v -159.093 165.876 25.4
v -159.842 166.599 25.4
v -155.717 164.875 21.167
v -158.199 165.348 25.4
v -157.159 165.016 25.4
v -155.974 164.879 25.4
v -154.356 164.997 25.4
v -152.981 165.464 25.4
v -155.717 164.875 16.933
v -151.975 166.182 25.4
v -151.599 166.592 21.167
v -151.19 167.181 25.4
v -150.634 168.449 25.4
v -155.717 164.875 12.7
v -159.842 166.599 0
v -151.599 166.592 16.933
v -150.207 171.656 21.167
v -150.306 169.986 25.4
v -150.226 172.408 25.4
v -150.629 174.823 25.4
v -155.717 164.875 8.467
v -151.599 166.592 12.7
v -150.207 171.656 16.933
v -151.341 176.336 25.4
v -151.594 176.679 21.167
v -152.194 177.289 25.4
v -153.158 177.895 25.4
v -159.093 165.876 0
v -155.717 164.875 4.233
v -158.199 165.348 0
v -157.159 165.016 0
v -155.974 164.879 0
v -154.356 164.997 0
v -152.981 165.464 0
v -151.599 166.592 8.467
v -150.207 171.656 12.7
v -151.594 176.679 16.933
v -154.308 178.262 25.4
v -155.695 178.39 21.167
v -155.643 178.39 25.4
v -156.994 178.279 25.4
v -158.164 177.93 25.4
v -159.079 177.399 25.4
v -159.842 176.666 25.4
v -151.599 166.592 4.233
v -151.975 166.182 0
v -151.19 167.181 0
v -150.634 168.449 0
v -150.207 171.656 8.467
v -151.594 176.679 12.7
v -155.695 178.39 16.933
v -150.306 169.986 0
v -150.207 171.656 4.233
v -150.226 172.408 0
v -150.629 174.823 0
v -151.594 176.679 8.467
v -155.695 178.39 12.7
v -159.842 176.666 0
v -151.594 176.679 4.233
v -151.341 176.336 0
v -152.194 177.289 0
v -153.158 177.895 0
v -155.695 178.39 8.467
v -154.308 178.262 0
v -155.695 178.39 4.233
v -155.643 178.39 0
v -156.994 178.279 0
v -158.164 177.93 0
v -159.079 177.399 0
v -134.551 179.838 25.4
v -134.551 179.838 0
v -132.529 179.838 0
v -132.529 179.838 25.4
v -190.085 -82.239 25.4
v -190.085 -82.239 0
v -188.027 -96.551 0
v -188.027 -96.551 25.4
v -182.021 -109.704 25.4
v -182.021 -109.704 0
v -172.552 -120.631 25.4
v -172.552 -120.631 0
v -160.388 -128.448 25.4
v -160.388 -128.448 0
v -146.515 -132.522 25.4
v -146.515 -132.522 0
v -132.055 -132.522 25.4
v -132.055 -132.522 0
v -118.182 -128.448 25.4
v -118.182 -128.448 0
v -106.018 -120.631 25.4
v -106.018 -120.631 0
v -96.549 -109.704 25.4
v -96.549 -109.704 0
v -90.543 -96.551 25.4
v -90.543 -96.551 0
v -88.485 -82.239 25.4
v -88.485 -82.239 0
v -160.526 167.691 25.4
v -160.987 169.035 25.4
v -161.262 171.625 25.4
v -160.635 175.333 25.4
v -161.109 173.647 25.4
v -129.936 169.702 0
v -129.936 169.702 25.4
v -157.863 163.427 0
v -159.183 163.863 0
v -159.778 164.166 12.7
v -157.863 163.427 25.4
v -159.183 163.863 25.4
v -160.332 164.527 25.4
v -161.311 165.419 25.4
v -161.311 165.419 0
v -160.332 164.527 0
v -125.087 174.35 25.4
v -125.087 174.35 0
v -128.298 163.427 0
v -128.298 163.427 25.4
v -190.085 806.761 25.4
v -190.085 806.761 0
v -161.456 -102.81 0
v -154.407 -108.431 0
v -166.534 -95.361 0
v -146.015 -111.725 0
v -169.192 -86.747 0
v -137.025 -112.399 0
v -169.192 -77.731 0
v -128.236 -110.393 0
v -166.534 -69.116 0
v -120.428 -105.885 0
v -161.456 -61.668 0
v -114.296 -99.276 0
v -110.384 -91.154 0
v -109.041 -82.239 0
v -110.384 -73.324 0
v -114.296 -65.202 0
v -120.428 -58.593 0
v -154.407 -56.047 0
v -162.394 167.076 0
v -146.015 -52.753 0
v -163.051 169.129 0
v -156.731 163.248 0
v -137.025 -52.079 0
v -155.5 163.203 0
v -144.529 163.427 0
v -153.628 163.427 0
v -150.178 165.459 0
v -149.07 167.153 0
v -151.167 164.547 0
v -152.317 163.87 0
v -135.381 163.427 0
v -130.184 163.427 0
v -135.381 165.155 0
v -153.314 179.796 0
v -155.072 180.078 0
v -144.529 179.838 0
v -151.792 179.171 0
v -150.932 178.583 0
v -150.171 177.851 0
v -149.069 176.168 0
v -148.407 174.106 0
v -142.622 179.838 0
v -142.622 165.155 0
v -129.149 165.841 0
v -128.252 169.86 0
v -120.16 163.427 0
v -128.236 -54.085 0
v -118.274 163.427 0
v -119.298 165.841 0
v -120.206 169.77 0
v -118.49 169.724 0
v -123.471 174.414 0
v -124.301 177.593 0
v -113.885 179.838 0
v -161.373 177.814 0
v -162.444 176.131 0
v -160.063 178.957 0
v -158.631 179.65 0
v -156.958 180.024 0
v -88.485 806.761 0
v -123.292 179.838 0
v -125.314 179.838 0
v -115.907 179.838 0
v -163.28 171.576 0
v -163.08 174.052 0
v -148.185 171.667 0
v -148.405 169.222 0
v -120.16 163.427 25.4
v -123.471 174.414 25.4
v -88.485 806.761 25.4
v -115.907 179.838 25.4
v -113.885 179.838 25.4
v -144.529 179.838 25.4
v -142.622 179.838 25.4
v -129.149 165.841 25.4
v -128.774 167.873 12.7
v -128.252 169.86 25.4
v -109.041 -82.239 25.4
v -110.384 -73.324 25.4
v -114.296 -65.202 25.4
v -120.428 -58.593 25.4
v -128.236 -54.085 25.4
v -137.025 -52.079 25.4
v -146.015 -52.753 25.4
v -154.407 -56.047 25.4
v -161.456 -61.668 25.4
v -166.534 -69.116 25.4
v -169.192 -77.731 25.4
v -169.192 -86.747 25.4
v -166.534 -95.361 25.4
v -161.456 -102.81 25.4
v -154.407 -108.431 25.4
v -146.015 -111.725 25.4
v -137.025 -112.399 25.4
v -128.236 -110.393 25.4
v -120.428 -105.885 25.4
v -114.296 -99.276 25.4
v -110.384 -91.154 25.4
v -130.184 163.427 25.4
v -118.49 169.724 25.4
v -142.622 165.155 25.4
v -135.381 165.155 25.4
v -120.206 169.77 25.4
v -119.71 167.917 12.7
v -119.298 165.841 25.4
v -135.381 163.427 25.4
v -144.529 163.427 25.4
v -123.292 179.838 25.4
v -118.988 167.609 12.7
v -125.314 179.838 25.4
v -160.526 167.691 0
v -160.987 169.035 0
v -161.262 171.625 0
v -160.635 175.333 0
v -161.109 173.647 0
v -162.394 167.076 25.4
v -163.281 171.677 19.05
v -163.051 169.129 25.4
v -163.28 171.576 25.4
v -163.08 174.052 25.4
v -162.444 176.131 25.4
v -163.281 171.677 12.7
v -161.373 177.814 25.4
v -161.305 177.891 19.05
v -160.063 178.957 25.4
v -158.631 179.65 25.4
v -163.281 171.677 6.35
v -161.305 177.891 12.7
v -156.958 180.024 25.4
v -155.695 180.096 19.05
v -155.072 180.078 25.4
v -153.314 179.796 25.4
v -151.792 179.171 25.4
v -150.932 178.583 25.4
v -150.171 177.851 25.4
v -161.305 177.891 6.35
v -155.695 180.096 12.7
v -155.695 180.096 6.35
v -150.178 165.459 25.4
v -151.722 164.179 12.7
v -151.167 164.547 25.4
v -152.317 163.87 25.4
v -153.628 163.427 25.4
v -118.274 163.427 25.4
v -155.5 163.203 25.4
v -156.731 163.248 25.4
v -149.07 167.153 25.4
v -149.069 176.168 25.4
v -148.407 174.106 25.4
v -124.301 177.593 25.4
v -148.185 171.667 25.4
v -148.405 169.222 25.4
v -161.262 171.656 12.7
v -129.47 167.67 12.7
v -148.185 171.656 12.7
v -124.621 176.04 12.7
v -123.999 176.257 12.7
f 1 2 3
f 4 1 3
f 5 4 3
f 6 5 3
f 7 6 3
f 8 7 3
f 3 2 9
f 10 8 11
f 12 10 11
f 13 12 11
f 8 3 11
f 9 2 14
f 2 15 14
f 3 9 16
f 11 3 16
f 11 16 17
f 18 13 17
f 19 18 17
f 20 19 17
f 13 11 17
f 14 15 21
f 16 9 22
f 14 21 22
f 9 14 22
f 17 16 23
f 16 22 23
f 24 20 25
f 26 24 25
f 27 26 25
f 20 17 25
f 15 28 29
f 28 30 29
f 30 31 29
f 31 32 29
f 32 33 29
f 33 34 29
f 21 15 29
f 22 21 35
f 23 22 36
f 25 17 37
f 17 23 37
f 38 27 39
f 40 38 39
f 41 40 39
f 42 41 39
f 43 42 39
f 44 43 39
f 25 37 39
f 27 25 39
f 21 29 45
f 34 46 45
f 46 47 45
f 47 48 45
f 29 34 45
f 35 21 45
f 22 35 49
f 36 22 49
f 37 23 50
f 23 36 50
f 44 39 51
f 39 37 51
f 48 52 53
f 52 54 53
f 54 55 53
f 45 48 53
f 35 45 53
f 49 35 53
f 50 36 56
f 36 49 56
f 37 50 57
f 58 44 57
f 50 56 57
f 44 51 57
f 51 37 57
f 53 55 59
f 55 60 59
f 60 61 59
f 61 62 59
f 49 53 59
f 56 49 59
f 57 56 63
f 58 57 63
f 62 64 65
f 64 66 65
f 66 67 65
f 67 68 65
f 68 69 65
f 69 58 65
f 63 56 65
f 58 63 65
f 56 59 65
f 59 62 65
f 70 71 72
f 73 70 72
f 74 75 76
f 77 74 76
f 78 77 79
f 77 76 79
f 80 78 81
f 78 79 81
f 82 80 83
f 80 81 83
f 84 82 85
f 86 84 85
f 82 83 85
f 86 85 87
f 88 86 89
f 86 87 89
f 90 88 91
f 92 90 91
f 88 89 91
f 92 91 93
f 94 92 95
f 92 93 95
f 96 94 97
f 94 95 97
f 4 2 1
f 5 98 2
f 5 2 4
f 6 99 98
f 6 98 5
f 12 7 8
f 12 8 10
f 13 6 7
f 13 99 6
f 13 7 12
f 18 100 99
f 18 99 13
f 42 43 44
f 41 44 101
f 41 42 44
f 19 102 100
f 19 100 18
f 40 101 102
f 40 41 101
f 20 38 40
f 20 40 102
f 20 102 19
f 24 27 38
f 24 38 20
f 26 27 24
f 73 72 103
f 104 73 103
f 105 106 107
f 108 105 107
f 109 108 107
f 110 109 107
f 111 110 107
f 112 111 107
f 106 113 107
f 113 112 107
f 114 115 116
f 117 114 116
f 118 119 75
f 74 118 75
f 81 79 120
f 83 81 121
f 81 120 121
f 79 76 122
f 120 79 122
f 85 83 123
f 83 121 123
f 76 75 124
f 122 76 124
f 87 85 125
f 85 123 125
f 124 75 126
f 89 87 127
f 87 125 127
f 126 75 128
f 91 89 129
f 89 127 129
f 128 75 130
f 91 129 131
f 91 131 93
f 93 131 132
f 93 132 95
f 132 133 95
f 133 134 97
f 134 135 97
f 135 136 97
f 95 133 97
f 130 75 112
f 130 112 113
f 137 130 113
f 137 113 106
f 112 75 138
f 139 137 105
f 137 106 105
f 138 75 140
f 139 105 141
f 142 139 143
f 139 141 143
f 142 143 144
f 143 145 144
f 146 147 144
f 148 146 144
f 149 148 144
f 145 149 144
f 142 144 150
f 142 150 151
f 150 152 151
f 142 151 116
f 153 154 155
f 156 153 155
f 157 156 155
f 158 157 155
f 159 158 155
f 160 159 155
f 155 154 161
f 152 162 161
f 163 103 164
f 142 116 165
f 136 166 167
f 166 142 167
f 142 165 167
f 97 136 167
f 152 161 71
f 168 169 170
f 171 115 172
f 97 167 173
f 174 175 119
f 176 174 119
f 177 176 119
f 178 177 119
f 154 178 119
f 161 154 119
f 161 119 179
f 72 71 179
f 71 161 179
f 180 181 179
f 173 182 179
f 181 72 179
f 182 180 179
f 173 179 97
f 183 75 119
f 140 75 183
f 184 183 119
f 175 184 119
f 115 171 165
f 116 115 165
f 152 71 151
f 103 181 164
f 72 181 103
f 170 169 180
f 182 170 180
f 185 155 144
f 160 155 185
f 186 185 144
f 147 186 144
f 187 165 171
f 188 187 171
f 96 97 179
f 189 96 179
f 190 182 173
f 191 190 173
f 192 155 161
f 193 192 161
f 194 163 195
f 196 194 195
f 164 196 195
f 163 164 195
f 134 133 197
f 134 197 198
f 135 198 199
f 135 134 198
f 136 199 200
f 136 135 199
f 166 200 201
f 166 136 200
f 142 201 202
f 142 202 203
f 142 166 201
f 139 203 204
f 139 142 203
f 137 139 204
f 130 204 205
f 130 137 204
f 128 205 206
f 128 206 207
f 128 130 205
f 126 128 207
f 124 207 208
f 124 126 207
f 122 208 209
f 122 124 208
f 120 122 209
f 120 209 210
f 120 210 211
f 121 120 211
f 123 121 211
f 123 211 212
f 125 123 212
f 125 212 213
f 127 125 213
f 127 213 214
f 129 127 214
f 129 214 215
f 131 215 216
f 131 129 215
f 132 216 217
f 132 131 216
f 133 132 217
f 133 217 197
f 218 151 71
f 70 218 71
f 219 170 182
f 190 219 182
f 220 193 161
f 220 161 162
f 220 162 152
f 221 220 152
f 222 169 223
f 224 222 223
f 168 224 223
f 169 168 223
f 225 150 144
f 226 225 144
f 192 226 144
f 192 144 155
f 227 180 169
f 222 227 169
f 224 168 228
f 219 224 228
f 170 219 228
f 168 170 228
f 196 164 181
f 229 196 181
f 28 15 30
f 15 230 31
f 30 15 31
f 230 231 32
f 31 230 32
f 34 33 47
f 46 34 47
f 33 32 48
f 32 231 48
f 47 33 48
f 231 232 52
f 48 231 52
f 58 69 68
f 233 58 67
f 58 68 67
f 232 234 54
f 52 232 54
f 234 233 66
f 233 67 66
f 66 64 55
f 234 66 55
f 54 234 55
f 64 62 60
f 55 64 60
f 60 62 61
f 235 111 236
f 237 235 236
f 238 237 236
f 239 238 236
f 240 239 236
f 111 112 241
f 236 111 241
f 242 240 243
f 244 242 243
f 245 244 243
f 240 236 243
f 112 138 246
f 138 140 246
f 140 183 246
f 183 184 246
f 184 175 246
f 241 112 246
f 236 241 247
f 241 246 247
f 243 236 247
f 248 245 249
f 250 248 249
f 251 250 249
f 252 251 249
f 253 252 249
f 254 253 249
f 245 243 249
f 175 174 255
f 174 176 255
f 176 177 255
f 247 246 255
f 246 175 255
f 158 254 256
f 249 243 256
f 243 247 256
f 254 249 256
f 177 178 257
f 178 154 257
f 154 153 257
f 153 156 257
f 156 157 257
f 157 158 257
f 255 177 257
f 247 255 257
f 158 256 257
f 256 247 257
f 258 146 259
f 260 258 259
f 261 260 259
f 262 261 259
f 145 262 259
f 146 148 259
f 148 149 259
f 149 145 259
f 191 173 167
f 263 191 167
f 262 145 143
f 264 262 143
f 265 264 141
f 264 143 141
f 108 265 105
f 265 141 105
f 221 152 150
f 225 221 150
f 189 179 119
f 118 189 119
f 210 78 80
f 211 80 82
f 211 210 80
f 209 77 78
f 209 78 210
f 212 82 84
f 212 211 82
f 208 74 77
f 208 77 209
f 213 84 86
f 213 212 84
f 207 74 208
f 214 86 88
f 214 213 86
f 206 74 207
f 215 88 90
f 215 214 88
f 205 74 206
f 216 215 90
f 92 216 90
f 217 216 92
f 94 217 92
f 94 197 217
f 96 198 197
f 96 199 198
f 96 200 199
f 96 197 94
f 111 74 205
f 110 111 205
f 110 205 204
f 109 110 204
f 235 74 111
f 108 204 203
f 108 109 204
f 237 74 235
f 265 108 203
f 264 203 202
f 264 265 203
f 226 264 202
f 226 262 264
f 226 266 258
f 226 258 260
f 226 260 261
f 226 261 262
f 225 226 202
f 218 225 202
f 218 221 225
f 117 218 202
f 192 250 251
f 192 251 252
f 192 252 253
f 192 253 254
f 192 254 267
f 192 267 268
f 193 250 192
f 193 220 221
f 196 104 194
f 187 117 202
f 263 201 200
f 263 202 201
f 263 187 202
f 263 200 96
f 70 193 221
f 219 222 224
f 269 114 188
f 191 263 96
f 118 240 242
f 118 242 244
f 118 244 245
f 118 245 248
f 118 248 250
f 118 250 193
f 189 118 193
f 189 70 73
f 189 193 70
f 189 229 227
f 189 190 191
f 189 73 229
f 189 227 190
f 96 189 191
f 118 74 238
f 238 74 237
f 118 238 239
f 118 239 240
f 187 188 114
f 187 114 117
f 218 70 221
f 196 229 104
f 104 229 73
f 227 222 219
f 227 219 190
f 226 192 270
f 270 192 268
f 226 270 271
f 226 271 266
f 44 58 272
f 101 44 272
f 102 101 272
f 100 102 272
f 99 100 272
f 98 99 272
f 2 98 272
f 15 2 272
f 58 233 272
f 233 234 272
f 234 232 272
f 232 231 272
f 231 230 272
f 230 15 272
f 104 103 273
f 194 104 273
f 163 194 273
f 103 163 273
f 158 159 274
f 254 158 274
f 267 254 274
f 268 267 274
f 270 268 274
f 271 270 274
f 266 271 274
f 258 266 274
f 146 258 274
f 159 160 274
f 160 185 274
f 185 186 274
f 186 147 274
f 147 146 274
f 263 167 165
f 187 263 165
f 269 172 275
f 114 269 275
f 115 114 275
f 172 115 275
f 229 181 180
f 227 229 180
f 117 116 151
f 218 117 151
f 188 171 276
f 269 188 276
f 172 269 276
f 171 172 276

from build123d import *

# Parameters (mm, degrees)
F0_R     = 30.2442698834
F1_DEPTH = 25.4


with BuildPart() as f1:
    # F0 (on Top) → F1 (new body)
    with BuildSketch(Plane.XY):
        with BuildLine():
            ThreePointArc((-190.0850385427, -82.2389796376), (-139.2850385427, -133.0389796376), (-88.4850385427, -82.2389796376))
            Line((-88.4850385427, -82.2389796376), (-88.4850385427, 806.7610203624))
            Line((-88.4850385427, 806.7610203624), (-190.0850385427, 806.7610203624))
            Line((-190.0850385427, 806.7610203624), (-190.0850385427, -82.2389796376))
        make_face()
        with Locations((-139.2850385427, -82.2389796376)):
            Circle(F0_R, mode=Mode.SUBTRACT)
        with BuildLine():
            Line((-113.8850385427, 179.8376055464), (-113.8850385427, 163.4274528315))
            Line((-113.8850385427, 163.4274528315), (-118.274009131, 163.4274528315))
            Line((-118.274009131, 163.4274528315), (-120.1596143346, 163.4274528315))
            Line((-120.1596143346, 163.4274528315), (-128.2982455563, 163.4274528315))
            Line((-128.2982455563, 163.4274528315), (-130.1838507599, 163.4274528315))
            Line((-130.1838507599, 163.4274528315), (-135.380937864, 163.4274528315))
            Line((-135.380937864, 163.4274528315), (-144.5288168233, 163.4274528315))
            Line((-144.5288168233, 163.4274528315), (-153.6275803556, 163.4274528315))
            add(Edge.make_bspline(
                [(-153.6275803556, 163.4274528315), (-154.5943963548, 163.201180207), (-155.7167410314, 163.201180207)],
                knots=[0.6833950988, 0.6833950988, 0.6833950988, 1, 1, 1], degree=2))
            add(Edge.make_bspline(
                [(-155.7167410314, 163.201180207), (-156.8742768127, 163.201180207), (-157.8630700132, 163.4274528315)],
                knots=[0, 0, 0, 0.319412416, 0.319412416, 0.319412416], degree=2))
            Line((-157.8630700132, 163.4274528315), (-164.6850385427, 163.4274528315))
            Line((-164.6850385427, 163.4274528315), (-164.6850385427, 713.4521007538))
            Line((-164.6850385427, 713.4521007538), (-113.8850385427, 713.4521007538))
            Line((-113.8850385427, 713.4521007538), (-113.8850385427, 179.8376055464))
        make_face(mode=Mode.SUBTRACT)
        with BuildLine():
            Line((-115.9071256468, 179.8376055464), (-113.8850385427, 179.8376055464))
            Line((-113.8850385427, 179.8376055464), (-113.8850385427, 713.4521007538))
            Line((-113.8850385427, 713.4521007538), (-164.6850385427, 713.4521007538))
            Line((-164.6850385427, 713.4521007538), (-164.6850385427, 163.4274528315))
            Line((-164.6850385427, 163.4274528315), (-157.8630700132, 163.4274528315))
            add(Edge.make_bspline(
                [(-157.8630700132, 163.4274528315), (-159.9699398208, 163.9095829275), (-161.3107031355, 165.4190110894)],
                knots=[0.319412416, 0.319412416, 0.319412416, 1, 1, 1], degree=2))
            add(Edge.make_bspline(
                [(-161.3107031355, 165.4190110894), (-163.2807116197, 167.6368419717), (-163.2807116197, 171.6774245509)],
                knots=[0, 0, 0, 1, 1, 1], degree=2))
            add(Edge.make_bspline(
                [(-163.2807116197, 171.6774245509), (-163.2807116197, 175.6856824695), (-161.3053156921, 177.8909426505)],
                knots=[0, 0, 0, 1, 1, 1], degree=2))
            add(Edge.make_bspline(
                [(-161.3053156921, 177.8909426505), (-159.3299197645, 180.0962028315), (-155.6951912577, 180.0962028315)],
                knots=[0, 0, 0, 1, 1, 1], degree=2))
            add(Edge.make_bspline(
                [(-155.6951912577, 180.0962028315), (-152.1574367328, 180.0962028315), (-150.1712659183, 177.8514347319)],
                knots=[0, 0, 0, 1, 1, 1], degree=2))
            add(Edge.make_bspline(
                [(-150.1712659183, 177.8514347319), (-148.1850951038, 175.6066666324), (-148.1850951038, 171.6558747772)],
                knots=[0, 0, 0, 1, 1, 1], degree=2))
            add(Edge.make_bspline(
                [(-148.1850951038, 171.6558747772), (-148.1850951038, 167.7158578088), (-150.1784491762, 165.4585190079)],
                knots=[0, 0, 0, 1, 1, 1], degree=2))
            add(Edge.make_bspline(
                [(-150.1784491762, 165.4585190079), (-151.5406975794, 163.9158647351), (-153.6275803556, 163.4274528315)],
                knots=[0, 0, 0, 0.6833950988, 0.6833950988, 0.6833950988], degree=2))
            Line((-153.6275803556, 163.4274528315), (-144.5288168233, 163.4274528315))
            Line((-144.5288168233, 163.4274528315), (-144.5288168233, 179.8376055464))
            Line((-144.5288168233, 179.8376055464), (-142.6216618459, 179.8376055464))
            Line((-142.6216618459, 179.8376055464), (-142.6216618459, 165.1550263609))
            Line((-142.6216618459, 165.1550263609), (-135.380937864, 165.1550263609))
            Line((-135.380937864, 165.1550263609), (-135.380937864, 163.4274528315))
            Line((-135.380937864, 163.4274528315), (-130.1838507599, 163.4274528315))
            Line((-130.1838507599, 163.4274528315), (-134.5512715744, 179.8376055464))
            Line((-134.5512715744, 179.8376055464), (-132.5291844703, 179.8376055464))
            Line((-132.5291844703, 179.8376055464), (-129.9360283618, 169.7020286233))
            add(Edge.make_bspline(
                [(-129.9360283618, 169.7020286233), (-129.3972840179, 167.5686010215), (-129.1494616197, 165.8410274921)],
                knots=[0, 0, 0, 1, 1, 1], degree=2))
            add(Edge.make_bspline(
                [(-129.1494616197, 165.8410274921), (-128.8477647871, 167.8954392568), (-128.2515543799, 169.8600602975)],
                knots=[0, 0, 0, 1, 1, 1], degree=2))
            Line((-128.2515543799, 169.8600602975), (-125.3136018912, 179.8376055464))
            Line((-125.3136018912, 179.8376055464), (-123.2915147871, 179.8376055464))
            Line((-123.2915147871, 179.8376055464), (-120.2063055111, 169.7702695735))
            add(Edge.make_bspline(
                [(-120.2063055111, 169.7702695735), (-119.6675611672, 168.0283295283), (-119.2976233844, 165.8410274921)],
                knots=[0, 0, 0, 1, 1, 1], degree=2))
            add(Edge.make_bspline(
                [(-119.2976233844, 165.8410274921), (-119.0821256468, 167.43571075), (-118.4895068685, 169.7235783971)],
                knots=[0, 0, 0, 1, 1, 1], degree=2))
            Line((-118.4895068685, 169.7235783971), (-115.9071256468, 179.8376055464))
        make_face()
        with BuildLine():
            Line((-128.2982455563, 163.4274528315), (-120.1596143346, 163.4274528315))
            Line((-120.1596143346, 163.4274528315), (-123.4710962351, 174.4142458179))
            add(Edge.make_bspline(
                [(-123.4710962351, 174.4142458179), (-123.7081437464, 175.1469381256), (-123.9990656921, 176.256751474)],
                knots=[0, 0, 0, 1, 1, 1], degree=2))
            add(Edge.make_bspline(
                [(-123.9990656921, 176.256751474), (-124.2899876378, 177.3665648224), (-124.3007625246, 177.5928374468)],
                knots=[0, 0, 0, 1, 1, 1], degree=2))
            add(Edge.make_bspline(
                [(-124.3007625246, 177.5928374468), (-124.5485849228, 176.1094946867), (-125.0873292667, 174.3495964966)],
                knots=[0, 0, 0, 1, 1, 1], degree=2))
            Line((-125.0873292667, 174.3495964966), (-128.2982455563, 163.4274528315))
        make_face()
        Polygon((-118.274009131, 163.4274528315), (-113.8850385427, 163.4274528315), (-113.8850385427, 179.8376055464), align=None)
    extrude(amount=F1_DEPTH)


with BuildPart() as f1b:
    # F0 (on Top) → F1, piece 2 (new body)
    with BuildSketch(Plane.XY):
        with BuildLine():
            add(Edge.make_bspline(
                [(-159.8417268912, 176.6661971754), (-161.2622161446, 174.9422152749), (-161.2622161446, 171.6558747772)],
                knots=[0, 0, 0, 1, 1, 1], degree=2))
            add(Edge.make_bspline(
                [(-161.2622161446, 171.6558747772), (-161.2622161446, 168.322843103), (-159.8417268912, 166.5988612025)],
                knots=[0, 0, 0, 1, 1, 1], degree=2))
            add(Edge.make_bspline(
                [(-159.8417268912, 166.5988612025), (-158.4212376378, 164.8748793021), (-155.7167410314, 164.8748793021)],
                knots=[0, 0, 0, 1, 1, 1], degree=2))
            add(Edge.make_bspline(
                [(-155.7167410314, 164.8748793021), (-152.9906946513, 164.8748793021), (-151.5989384296, 166.5916779446)],
                knots=[0, 0, 0, 1, 1, 1], degree=2))
            add(Edge.make_bspline(
                [(-151.5989384296, 166.5916779446), (-150.2071822079, 168.3084765871), (-150.2071822079, 171.6558747772)],
                knots=[0, 0, 0, 1, 1, 1], degree=2))
            add(Edge.make_bspline(
                [(-150.2071822079, 171.6558747772), (-150.2071822079, 174.9673566776), (-151.5935509862, 176.6787678767)],
                knots=[0, 0, 0, 1, 1, 1], degree=2))
            add(Edge.make_bspline(
                [(-151.5935509862, 176.6787678767), (-152.9799197645, 178.3901790758), (-155.6951912577, 178.3901790758)],
                knots=[0, 0, 0, 1, 1, 1], degree=2))
            add(Edge.make_bspline(
                [(-155.6951912577, 178.3901790758), (-158.4212376378, 178.3901790758), (-159.8417268912, 176.6661971754)],
                knots=[0, 0, 0, 1, 1, 1], degree=2))
        make_face()
    extrude(amount=F1_DEPTH)


solid = Compound([f1.part, f1b.part])
